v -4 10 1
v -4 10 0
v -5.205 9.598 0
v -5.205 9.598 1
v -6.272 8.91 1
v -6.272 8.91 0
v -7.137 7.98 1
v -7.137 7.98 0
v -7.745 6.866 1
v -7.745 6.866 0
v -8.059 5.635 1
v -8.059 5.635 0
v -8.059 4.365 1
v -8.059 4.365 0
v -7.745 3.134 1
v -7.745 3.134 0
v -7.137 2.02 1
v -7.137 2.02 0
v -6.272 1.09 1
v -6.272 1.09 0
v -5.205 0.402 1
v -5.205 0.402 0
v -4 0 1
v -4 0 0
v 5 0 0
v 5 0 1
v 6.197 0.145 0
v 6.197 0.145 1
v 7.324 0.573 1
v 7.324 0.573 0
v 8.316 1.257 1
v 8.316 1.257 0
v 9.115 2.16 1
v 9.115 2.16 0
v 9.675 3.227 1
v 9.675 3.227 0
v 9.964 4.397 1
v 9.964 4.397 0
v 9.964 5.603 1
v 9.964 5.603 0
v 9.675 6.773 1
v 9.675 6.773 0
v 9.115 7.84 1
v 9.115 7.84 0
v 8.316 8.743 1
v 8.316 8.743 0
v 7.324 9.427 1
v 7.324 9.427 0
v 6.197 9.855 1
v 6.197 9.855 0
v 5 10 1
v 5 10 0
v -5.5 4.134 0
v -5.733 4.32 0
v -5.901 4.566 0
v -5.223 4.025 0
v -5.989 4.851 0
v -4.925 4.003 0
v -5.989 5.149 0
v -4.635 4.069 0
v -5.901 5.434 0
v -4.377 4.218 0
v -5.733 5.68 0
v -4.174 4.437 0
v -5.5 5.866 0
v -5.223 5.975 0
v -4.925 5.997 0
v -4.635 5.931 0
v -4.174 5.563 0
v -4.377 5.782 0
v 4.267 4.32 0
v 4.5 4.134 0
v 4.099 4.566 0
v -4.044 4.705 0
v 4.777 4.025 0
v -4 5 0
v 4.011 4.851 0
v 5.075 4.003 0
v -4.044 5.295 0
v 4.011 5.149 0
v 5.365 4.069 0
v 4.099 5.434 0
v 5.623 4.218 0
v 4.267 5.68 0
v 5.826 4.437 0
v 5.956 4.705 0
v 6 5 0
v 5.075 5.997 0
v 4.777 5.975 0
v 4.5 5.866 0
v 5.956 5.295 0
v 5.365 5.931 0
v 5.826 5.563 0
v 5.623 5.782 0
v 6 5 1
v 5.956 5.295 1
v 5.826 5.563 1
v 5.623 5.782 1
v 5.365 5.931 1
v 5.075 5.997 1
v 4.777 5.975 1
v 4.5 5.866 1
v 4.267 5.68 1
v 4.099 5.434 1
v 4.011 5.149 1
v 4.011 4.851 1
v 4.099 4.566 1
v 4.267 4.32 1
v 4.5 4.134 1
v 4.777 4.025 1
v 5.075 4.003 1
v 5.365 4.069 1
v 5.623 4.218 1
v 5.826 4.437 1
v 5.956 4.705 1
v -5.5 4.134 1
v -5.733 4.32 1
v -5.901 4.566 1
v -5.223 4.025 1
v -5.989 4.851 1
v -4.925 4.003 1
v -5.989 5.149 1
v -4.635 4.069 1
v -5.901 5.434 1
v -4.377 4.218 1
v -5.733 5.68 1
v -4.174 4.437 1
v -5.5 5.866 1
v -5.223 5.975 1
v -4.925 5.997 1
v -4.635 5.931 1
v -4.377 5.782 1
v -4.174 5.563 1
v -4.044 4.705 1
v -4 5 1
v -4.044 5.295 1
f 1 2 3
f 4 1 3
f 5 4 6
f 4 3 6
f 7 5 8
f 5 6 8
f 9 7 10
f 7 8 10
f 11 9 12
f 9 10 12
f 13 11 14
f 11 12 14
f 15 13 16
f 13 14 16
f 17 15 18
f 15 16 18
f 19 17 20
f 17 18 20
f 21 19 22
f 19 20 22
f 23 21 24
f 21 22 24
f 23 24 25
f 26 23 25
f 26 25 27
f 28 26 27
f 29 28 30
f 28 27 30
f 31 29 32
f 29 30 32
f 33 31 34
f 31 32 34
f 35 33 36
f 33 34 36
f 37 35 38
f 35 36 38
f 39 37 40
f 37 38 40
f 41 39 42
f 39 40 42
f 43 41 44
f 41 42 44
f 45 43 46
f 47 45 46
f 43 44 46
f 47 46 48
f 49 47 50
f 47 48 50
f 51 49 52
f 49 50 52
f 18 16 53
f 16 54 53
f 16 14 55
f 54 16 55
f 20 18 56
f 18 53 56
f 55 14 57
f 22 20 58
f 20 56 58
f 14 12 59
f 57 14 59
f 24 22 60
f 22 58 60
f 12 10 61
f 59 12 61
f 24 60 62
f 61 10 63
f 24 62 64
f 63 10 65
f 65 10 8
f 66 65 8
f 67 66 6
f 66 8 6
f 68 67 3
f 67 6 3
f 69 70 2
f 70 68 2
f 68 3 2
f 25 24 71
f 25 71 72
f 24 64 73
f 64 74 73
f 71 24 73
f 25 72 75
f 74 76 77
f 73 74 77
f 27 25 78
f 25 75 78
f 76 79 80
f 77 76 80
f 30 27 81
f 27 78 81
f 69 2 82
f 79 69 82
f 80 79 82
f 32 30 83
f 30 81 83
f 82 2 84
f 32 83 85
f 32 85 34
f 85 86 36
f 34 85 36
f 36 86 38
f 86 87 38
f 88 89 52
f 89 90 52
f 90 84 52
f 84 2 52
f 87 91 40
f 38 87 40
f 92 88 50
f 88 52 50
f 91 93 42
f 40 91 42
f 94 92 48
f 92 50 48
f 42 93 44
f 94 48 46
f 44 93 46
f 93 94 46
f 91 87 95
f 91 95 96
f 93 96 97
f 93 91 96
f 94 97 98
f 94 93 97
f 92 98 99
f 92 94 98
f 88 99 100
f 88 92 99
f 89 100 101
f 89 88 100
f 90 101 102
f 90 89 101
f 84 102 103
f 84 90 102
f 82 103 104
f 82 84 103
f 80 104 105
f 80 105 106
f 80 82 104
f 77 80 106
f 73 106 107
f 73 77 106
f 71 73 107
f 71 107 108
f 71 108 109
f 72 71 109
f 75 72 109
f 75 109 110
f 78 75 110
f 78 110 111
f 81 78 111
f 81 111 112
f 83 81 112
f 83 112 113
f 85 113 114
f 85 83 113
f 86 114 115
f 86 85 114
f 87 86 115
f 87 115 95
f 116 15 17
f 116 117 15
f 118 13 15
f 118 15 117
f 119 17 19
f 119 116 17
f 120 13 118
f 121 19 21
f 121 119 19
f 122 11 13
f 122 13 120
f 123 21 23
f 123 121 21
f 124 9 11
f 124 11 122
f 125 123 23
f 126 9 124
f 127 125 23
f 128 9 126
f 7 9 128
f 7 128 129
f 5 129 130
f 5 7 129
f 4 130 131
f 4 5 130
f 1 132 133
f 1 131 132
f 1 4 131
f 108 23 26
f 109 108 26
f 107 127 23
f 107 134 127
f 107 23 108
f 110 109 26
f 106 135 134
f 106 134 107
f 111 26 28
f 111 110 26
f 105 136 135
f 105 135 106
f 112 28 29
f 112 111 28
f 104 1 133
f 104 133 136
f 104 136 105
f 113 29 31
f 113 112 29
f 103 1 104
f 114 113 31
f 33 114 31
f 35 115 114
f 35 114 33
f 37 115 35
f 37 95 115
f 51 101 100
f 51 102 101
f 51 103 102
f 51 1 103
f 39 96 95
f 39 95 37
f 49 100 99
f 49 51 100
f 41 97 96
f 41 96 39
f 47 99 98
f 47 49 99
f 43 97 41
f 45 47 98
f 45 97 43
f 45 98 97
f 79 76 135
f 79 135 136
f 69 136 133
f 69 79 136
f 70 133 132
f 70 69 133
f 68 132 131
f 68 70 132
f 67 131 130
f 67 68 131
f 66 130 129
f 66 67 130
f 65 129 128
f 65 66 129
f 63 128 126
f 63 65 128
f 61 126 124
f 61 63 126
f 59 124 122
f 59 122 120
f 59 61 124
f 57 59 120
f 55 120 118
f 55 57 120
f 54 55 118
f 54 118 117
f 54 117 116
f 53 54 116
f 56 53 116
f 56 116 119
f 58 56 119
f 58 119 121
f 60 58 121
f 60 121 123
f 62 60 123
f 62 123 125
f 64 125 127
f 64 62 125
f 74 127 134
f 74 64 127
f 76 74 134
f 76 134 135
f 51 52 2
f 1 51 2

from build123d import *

# Parameters (mm, degrees)
SKETCH6_R           = 1
BOSS_EXTRUDE4_DEPTH = 1


with BuildPart() as part:
    # Sketch6 → Boss-Extrude4 (new body)
    with BuildSketch(Plane.XY):
        with BuildLine():
            Line((0, 10), (-3, 10))
            Line((-3, 10), (-4, 10))
            ThreePointArc((-4, 10), (-8.099019514, 5), (-4, 0))
            Line((-4, 0), (-3, 0))
            Line((-3, 0), (0, 0))
            Line((0, 0), (5, 0))
            ThreePointArc((5, 0), (10, 5), (5, 10))
            Line((5, 10), (0, 10))
        make_face()
        with Locations((5, 5)):
            Circle(SKETCH6_R, mode=Mode.SUBTRACT)
        with Locations((-5, 5)):
            Circle(SKETCH6_R, mode=Mode.SUBTRACT)
    extrude(amount=BOSS_EXTRUDE4_DEPTH)


solid = part.part
